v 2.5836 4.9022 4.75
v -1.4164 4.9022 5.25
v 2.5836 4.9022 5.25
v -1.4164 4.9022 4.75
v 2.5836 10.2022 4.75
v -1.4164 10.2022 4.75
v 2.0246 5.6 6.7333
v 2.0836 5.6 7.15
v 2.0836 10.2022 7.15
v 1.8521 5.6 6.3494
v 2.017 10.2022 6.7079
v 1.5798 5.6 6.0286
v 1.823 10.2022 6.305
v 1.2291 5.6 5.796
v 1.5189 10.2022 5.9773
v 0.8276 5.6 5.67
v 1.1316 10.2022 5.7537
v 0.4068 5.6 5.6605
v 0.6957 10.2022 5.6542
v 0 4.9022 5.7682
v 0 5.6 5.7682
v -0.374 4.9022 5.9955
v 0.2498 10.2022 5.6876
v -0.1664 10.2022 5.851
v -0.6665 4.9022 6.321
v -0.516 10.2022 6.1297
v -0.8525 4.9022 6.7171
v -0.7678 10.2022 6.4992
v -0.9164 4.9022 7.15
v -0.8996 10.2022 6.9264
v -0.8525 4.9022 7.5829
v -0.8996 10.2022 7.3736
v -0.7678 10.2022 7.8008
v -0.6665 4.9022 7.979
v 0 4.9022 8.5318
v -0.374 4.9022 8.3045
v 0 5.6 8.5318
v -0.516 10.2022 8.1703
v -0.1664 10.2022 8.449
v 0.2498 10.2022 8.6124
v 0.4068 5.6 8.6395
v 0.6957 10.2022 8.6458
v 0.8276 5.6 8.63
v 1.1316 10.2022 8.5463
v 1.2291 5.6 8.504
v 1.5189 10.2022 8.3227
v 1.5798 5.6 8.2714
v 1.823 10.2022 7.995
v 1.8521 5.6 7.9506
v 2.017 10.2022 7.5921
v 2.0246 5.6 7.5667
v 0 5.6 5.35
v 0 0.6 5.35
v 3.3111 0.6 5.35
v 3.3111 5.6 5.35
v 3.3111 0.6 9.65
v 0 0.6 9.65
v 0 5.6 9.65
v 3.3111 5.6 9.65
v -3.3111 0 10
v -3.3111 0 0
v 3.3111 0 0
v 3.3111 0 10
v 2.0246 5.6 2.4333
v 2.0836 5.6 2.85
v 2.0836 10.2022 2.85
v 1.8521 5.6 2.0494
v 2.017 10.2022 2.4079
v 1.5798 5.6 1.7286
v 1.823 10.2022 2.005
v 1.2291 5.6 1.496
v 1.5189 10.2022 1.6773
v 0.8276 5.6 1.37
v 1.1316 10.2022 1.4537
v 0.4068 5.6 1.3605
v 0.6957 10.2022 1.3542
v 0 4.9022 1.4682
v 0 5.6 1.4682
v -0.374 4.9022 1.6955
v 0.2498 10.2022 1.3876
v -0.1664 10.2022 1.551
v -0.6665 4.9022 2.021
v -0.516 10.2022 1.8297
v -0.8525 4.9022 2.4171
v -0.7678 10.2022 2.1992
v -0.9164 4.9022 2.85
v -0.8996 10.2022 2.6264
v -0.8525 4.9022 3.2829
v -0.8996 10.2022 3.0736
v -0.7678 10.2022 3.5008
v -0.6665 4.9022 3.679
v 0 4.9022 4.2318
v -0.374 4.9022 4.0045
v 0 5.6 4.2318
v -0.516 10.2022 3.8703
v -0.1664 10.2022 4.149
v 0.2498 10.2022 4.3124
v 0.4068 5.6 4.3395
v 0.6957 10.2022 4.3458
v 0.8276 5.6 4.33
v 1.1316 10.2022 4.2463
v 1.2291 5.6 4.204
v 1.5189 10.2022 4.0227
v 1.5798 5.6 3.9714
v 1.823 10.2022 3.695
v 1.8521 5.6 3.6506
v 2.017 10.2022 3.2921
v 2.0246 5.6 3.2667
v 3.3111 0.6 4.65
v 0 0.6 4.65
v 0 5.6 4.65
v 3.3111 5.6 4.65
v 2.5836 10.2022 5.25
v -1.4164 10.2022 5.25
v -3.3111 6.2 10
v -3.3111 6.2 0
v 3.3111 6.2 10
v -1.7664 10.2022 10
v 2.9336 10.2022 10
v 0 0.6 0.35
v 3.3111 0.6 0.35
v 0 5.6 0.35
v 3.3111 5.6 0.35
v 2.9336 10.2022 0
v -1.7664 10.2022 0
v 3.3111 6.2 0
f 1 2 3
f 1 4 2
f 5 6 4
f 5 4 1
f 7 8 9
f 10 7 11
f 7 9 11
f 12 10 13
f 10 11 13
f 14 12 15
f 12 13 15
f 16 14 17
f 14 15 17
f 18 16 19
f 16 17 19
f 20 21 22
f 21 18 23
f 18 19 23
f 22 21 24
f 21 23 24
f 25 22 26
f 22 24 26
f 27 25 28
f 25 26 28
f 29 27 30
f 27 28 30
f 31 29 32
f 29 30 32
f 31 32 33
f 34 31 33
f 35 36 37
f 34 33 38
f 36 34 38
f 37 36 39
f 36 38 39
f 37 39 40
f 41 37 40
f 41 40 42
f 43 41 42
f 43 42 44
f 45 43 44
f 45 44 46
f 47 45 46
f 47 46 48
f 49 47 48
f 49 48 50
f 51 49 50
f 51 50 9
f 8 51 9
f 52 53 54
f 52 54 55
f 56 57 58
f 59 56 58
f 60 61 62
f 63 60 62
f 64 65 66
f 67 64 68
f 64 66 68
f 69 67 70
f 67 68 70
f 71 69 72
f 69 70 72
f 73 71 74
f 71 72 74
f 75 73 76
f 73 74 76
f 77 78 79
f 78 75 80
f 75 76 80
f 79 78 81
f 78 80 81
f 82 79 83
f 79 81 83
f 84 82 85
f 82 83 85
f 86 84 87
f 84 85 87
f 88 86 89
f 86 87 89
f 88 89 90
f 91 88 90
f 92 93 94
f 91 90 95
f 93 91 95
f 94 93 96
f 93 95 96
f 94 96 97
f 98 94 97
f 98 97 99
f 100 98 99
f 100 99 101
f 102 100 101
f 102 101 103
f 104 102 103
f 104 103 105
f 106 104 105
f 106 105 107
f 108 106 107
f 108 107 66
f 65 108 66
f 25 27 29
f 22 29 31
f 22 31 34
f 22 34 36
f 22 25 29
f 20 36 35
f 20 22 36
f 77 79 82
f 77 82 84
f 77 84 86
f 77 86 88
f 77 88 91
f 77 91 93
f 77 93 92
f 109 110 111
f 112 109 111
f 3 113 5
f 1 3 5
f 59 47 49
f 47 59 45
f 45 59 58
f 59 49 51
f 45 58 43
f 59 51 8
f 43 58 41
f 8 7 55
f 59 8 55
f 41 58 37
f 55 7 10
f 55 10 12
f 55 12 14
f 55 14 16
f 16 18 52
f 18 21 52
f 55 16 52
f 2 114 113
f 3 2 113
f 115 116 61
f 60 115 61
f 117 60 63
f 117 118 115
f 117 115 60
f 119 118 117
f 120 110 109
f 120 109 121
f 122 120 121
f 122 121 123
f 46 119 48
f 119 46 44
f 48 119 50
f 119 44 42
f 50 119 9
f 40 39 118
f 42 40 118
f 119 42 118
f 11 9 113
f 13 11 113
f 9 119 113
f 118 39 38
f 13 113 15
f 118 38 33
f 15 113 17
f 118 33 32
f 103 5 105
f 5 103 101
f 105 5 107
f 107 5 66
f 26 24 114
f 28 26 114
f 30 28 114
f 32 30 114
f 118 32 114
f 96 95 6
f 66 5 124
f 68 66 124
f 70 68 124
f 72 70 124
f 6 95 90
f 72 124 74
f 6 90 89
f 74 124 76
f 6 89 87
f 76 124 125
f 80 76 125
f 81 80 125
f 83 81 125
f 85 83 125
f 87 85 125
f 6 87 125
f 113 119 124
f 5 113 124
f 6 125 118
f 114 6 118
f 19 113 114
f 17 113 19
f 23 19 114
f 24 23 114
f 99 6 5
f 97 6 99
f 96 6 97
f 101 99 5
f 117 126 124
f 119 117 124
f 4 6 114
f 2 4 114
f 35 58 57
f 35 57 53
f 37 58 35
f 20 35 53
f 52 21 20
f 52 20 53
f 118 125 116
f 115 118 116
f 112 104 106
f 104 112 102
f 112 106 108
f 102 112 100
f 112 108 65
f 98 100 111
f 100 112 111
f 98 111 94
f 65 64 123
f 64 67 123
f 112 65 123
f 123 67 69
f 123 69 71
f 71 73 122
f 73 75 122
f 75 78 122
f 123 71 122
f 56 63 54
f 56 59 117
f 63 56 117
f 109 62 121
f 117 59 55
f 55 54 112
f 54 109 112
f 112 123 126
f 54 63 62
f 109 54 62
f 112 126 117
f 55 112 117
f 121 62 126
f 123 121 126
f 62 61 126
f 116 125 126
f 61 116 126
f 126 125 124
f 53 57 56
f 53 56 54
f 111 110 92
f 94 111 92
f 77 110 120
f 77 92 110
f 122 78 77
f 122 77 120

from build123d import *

# Parameters (mm, degrees)
BOSS_EXTRUDE2_DEPTH = 10
SKETCH3_W           = 4.3
SKETCH3_H           = 5
CUT_EXTRUDE3_DEPTH  = 4.3
SKETCH5_R           = 1.5
SKETCH5_W           = 4
SKETCH5_H           = 0.25
CUT_EXTRUDE4_DEPTH  = 5.3


with BuildPart() as part:
    # Sketch2 → Boss-Extrude2 (new body)
    with BuildSketch(Plane.XY):
        Polygon((-3.311102547, 0), (3.311102547, 0), (3.311102547, 6.2), (2.933626588, 10.202238361), (-1.766373412, 10.202238361), (-3.311102547, 6.2), align=None)
    extrude(amount=BOSS_EXTRUDE2_DEPTH)

    # Sketch3 → Cut-Extrude3 (cut)
    with BuildSketch(Plane(origin=(0, 0, 0), x_dir=(0, 0, -1), z_dir=(1, 0, 0))):
        with Locations((-2.5, 3.1)):
            Rectangle(SKETCH3_W, SKETCH3_H)
        with Locations((-7.5, 3.1)):
            Rectangle(SKETCH3_W, SKETCH3_H)
    extrude(amount=CUT_EXTRUDE3_DEPTH, mode=Mode.SUBTRACT)

    # Sketch5 → Cut-Extrude4 (cut)
    with BuildSketch(Plane(origin=(0, 10.202238361, 0), x_dir=(1, 0, 0), z_dir=(0, 1, 0))):
        with Locations((0.583626588, -7.15)):
            Circle(SKETCH5_R)
        with Locations((0.583626588, -5.125)):
            Rectangle(SKETCH5_W, SKETCH5_H)
        with Locations((0.583626588, -4.875)):
            Rectangle(SKETCH5_W, SKETCH5_H)
        with Locations((0.583626588, -2.85)):
            Circle(SKETCH5_R)
    extrude(amount=-CUT_EXTRUDE4_DEPTH, mode=Mode.SUBTRACT)


solid = part.part
